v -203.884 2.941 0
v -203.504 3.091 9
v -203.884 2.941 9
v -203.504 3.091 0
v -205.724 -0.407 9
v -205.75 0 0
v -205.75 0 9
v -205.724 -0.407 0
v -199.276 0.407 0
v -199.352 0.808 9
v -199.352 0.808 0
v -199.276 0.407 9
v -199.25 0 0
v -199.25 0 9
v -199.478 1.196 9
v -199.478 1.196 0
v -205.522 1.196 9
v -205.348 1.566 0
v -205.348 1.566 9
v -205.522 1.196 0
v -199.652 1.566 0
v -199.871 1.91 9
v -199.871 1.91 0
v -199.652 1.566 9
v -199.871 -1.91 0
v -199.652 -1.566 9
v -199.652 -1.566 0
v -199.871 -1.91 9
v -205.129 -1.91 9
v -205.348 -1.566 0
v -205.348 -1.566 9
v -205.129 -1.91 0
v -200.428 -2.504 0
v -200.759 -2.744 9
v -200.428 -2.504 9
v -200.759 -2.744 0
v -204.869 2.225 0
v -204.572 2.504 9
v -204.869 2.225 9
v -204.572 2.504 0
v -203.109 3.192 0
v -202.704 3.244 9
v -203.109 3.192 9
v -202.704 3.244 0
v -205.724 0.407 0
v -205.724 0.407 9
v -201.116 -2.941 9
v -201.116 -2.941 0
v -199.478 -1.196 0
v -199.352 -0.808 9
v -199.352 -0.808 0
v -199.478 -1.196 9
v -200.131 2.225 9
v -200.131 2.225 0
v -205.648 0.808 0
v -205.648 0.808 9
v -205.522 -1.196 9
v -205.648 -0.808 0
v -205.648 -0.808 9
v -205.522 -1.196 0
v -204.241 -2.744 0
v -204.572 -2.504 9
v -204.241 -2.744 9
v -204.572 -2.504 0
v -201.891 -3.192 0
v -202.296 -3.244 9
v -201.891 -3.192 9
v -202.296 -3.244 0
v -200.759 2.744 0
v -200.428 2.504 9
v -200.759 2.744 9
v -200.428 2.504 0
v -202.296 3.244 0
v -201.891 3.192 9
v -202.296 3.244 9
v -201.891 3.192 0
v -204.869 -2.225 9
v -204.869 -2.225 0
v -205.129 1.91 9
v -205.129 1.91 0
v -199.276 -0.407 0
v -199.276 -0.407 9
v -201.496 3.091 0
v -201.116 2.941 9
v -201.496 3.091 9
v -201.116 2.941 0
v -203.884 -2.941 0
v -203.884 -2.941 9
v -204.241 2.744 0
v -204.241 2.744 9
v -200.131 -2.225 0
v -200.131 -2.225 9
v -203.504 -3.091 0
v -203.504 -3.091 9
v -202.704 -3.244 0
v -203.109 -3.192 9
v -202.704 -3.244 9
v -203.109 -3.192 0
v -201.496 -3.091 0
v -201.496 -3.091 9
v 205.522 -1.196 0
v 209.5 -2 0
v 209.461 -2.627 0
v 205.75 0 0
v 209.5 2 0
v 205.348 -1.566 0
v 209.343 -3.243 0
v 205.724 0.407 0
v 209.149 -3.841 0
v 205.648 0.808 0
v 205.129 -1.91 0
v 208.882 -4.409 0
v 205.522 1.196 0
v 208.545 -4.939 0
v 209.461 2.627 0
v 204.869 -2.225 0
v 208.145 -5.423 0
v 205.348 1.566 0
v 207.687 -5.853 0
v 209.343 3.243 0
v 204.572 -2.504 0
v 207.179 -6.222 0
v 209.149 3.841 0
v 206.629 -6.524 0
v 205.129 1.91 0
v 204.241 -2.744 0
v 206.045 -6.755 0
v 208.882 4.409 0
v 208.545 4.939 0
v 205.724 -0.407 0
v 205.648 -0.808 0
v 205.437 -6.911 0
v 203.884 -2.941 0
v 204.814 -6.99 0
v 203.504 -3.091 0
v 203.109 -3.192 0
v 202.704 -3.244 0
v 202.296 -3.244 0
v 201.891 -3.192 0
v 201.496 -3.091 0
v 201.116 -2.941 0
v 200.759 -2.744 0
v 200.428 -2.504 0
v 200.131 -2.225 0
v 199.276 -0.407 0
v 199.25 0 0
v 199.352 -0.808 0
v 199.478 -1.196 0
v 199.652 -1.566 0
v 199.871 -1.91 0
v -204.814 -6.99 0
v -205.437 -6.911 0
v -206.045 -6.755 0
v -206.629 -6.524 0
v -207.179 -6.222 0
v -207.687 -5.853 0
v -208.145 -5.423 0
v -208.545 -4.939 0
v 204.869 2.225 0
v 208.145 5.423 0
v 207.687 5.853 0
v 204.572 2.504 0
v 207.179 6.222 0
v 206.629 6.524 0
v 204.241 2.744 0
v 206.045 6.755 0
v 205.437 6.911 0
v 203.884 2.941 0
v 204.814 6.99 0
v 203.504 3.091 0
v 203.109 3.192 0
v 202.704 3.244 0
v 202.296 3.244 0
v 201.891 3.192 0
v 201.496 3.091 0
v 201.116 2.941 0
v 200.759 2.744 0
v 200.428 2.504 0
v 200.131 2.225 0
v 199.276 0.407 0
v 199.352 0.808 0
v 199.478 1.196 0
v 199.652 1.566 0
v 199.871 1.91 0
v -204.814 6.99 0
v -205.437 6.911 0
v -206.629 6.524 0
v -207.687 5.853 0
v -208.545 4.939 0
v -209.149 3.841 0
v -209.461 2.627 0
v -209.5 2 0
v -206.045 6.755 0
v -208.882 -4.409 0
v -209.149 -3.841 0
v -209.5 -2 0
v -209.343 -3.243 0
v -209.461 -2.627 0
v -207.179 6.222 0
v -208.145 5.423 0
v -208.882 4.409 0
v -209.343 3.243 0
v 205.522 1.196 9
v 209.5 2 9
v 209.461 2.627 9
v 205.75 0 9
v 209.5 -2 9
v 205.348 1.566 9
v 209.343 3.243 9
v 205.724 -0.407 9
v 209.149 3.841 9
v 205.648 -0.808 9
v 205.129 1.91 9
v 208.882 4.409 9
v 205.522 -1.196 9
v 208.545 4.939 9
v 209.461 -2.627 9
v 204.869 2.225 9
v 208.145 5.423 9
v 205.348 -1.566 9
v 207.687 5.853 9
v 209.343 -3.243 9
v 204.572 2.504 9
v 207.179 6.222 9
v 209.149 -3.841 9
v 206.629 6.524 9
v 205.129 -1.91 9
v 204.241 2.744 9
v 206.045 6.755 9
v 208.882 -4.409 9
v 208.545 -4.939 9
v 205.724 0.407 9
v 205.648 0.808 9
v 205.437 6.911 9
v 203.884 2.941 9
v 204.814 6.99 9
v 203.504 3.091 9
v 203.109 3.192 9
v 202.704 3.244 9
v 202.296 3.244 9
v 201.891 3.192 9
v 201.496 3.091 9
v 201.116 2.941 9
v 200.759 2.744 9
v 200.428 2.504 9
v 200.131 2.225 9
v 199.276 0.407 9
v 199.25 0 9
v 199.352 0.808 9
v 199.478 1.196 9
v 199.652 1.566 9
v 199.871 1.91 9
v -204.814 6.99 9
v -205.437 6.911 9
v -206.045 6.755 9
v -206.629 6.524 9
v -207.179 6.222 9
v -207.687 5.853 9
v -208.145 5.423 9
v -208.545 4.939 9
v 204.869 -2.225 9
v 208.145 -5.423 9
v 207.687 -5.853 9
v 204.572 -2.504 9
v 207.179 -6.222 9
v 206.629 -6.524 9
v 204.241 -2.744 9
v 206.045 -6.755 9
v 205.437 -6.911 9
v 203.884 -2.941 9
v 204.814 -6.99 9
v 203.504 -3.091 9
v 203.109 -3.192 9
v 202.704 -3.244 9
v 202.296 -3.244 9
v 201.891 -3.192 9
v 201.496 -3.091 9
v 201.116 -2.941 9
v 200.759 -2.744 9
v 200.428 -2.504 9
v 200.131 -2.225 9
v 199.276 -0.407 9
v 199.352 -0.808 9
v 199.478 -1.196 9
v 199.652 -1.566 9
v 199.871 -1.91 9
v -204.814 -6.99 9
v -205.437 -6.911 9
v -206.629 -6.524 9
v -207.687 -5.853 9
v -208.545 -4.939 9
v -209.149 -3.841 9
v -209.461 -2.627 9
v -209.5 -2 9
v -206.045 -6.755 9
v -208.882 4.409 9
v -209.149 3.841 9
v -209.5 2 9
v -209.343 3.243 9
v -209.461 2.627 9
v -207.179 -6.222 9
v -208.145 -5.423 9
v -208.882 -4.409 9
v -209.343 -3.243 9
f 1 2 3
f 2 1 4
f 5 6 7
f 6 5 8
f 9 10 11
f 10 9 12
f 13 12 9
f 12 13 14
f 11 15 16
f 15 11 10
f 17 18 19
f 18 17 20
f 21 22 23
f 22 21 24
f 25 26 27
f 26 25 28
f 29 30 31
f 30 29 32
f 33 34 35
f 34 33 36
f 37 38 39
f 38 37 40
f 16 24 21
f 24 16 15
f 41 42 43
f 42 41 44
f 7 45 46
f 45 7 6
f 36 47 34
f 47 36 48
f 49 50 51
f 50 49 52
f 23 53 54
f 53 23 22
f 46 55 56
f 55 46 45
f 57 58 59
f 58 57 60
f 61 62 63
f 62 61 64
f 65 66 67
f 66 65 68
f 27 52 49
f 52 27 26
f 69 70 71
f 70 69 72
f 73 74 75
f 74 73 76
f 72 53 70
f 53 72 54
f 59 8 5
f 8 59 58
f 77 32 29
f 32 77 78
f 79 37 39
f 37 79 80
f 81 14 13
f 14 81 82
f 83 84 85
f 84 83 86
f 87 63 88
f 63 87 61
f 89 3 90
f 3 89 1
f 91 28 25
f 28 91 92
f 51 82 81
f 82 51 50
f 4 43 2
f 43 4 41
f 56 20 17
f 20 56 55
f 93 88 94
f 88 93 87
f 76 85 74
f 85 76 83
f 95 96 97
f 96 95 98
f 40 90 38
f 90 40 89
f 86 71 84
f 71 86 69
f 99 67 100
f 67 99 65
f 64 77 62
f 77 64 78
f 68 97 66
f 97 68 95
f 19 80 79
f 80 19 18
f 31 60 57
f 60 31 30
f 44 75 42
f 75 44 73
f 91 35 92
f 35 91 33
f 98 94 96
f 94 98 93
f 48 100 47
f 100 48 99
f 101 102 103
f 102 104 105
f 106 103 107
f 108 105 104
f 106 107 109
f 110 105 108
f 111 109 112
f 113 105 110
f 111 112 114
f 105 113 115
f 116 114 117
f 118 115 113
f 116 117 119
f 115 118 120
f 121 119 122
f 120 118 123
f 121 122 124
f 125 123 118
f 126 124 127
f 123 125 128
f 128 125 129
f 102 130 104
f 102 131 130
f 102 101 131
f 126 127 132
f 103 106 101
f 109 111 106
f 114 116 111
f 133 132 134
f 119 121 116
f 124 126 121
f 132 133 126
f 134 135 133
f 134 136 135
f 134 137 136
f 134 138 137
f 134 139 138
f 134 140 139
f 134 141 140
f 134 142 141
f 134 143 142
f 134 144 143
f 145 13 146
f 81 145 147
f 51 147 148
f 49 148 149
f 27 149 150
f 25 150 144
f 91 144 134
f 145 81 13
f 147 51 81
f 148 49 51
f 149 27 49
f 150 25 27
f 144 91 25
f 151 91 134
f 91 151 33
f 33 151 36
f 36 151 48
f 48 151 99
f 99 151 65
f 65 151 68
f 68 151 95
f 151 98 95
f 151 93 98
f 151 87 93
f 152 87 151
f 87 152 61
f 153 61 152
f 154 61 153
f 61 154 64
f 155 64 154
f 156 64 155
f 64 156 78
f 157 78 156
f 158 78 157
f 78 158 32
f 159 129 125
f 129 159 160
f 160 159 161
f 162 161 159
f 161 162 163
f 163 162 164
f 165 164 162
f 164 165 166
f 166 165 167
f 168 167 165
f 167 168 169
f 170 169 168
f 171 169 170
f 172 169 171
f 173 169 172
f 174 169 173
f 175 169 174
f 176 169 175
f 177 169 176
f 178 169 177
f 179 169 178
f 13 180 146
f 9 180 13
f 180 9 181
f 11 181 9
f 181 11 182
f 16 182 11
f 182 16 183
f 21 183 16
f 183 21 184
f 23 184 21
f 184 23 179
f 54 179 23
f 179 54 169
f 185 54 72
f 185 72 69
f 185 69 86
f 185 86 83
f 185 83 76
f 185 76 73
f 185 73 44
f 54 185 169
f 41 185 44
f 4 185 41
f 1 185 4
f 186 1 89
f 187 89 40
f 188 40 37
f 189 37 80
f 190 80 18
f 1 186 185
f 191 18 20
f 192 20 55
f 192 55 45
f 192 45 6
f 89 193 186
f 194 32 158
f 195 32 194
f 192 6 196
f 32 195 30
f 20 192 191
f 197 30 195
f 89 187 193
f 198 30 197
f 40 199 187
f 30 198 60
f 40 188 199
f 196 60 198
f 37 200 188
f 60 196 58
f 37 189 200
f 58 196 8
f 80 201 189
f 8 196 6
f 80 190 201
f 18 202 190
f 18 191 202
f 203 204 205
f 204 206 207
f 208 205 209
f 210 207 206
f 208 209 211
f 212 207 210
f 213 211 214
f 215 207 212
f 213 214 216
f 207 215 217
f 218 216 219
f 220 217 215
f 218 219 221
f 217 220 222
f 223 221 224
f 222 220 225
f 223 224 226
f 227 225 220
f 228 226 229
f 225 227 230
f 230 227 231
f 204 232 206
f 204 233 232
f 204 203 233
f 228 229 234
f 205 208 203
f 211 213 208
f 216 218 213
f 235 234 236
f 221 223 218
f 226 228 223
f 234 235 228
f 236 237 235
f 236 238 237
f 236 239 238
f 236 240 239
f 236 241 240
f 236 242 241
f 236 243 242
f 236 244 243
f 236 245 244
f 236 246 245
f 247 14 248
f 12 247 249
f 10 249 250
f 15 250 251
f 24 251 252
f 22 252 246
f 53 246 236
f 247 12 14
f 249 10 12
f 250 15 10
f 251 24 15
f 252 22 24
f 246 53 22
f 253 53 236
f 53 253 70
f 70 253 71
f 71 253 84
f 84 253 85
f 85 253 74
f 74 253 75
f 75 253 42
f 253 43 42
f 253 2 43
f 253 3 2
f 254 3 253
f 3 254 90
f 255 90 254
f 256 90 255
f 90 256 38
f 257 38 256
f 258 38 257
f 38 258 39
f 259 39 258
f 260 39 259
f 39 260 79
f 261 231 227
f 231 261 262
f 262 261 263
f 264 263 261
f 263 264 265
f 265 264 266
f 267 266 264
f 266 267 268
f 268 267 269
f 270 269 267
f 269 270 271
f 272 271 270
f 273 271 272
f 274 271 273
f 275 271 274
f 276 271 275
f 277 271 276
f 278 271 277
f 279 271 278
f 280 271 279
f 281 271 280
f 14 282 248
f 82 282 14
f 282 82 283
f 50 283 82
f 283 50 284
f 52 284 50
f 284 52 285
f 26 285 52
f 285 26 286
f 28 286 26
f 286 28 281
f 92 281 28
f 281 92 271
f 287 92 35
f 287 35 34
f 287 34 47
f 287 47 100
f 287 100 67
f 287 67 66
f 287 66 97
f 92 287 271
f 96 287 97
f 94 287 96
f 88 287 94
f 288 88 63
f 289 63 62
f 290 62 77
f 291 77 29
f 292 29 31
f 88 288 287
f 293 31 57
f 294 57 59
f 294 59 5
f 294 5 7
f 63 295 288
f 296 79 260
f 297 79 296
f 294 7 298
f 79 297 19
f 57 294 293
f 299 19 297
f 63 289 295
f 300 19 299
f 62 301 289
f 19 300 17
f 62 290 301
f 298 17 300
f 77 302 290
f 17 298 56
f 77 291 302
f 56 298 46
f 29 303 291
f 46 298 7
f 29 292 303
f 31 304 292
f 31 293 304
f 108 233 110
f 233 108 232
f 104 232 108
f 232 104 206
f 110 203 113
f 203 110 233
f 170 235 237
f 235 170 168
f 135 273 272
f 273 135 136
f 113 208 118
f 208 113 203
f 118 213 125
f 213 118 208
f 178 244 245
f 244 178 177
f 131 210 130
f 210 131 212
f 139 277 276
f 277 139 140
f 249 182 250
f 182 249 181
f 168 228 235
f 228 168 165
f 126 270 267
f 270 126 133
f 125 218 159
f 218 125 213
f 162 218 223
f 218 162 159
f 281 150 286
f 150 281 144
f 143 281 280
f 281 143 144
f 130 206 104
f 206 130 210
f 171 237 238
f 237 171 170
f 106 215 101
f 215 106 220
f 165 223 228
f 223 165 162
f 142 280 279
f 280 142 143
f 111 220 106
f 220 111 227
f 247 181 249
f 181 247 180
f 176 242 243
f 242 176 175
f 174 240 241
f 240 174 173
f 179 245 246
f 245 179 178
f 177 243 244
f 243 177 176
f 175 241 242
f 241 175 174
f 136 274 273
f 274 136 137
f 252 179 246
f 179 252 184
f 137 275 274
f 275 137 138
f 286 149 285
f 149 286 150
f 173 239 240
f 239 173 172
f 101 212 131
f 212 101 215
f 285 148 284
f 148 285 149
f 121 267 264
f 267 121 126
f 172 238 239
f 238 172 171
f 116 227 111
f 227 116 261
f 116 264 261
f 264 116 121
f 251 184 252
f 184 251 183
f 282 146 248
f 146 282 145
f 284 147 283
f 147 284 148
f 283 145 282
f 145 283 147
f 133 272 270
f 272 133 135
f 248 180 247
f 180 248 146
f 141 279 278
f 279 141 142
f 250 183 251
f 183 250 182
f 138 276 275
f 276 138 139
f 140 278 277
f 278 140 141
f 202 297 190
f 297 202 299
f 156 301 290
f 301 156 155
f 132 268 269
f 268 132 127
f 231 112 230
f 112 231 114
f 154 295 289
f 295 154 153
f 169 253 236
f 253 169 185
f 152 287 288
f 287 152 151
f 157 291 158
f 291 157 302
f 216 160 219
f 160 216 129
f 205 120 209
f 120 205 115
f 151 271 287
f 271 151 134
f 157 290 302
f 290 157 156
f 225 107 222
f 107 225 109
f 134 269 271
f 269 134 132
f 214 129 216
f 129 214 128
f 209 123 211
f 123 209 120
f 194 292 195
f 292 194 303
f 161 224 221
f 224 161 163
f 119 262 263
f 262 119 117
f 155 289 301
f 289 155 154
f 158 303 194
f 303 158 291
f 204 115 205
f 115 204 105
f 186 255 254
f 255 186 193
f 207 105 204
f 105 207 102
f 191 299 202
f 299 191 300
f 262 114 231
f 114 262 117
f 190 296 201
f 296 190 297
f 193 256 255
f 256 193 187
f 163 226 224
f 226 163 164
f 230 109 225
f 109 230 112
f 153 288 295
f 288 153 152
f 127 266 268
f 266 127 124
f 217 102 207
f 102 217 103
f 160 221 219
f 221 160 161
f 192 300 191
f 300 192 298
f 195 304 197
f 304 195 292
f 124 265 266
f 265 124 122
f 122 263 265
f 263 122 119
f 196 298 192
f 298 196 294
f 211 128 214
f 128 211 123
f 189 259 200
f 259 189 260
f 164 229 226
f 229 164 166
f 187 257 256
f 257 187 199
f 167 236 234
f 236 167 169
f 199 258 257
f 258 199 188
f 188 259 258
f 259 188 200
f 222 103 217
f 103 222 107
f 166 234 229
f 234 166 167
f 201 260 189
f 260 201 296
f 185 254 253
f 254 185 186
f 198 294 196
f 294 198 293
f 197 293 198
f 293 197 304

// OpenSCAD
$fn = 50;


difference() {
	union() {
		hull() {
			translate(v = [-204.5000000000, 2.0000000000, 0]) {
				cylinder(h = 9, r = 5);
			}
			translate(v = [204.5000000000, 2.0000000000, 0]) {
				cylinder(h = 9, r = 5);
			}
			translate(v = [-204.5000000000, -2.0000000000, 0]) {
				cylinder(h = 9, r = 5);
			}
			translate(v = [204.5000000000, -2.0000000000, 0]) {
				cylinder(h = 9, r = 5);
			}
		}
	}
	union() {
		translate(v = [-202.5000000000, 0.0000000000, 0]) {
			cylinder(h = 9, r = 3.2500000000);
		}
		translate(v = [202.5000000000, 0.0000000000, 0]) {
			cylinder(h = 9, r = 3.2500000000);
		}
		translate(v = [-202.5000000000, 0.0000000000, 0]) {
			cylinder(h = 9, r = 1.8000000000);
		}
		translate(v = [202.5000000000, 0.0000000000, 0]) {
			cylinder(h = 9, r = 1.8000000000);
		}
		translate(v = [-202.5000000000, 0.0000000000, 0]) {
			cylinder(h = 9, r = 1.8000000000);
		}
		translate(v = [202.5000000000, 0.0000000000, 0]) {
			cylinder(h = 9, r = 1.8000000000);
		}
		translate(v = [-202.5000000000, 0.0000000000, 0]) {
			cylinder(h = 9, r = 1.8000000000);
		}
		translate(v = [202.5000000000, 0.0000000000, 0]) {
			cylinder(h = 9, r = 1.8000000000);
		}
	}
}
